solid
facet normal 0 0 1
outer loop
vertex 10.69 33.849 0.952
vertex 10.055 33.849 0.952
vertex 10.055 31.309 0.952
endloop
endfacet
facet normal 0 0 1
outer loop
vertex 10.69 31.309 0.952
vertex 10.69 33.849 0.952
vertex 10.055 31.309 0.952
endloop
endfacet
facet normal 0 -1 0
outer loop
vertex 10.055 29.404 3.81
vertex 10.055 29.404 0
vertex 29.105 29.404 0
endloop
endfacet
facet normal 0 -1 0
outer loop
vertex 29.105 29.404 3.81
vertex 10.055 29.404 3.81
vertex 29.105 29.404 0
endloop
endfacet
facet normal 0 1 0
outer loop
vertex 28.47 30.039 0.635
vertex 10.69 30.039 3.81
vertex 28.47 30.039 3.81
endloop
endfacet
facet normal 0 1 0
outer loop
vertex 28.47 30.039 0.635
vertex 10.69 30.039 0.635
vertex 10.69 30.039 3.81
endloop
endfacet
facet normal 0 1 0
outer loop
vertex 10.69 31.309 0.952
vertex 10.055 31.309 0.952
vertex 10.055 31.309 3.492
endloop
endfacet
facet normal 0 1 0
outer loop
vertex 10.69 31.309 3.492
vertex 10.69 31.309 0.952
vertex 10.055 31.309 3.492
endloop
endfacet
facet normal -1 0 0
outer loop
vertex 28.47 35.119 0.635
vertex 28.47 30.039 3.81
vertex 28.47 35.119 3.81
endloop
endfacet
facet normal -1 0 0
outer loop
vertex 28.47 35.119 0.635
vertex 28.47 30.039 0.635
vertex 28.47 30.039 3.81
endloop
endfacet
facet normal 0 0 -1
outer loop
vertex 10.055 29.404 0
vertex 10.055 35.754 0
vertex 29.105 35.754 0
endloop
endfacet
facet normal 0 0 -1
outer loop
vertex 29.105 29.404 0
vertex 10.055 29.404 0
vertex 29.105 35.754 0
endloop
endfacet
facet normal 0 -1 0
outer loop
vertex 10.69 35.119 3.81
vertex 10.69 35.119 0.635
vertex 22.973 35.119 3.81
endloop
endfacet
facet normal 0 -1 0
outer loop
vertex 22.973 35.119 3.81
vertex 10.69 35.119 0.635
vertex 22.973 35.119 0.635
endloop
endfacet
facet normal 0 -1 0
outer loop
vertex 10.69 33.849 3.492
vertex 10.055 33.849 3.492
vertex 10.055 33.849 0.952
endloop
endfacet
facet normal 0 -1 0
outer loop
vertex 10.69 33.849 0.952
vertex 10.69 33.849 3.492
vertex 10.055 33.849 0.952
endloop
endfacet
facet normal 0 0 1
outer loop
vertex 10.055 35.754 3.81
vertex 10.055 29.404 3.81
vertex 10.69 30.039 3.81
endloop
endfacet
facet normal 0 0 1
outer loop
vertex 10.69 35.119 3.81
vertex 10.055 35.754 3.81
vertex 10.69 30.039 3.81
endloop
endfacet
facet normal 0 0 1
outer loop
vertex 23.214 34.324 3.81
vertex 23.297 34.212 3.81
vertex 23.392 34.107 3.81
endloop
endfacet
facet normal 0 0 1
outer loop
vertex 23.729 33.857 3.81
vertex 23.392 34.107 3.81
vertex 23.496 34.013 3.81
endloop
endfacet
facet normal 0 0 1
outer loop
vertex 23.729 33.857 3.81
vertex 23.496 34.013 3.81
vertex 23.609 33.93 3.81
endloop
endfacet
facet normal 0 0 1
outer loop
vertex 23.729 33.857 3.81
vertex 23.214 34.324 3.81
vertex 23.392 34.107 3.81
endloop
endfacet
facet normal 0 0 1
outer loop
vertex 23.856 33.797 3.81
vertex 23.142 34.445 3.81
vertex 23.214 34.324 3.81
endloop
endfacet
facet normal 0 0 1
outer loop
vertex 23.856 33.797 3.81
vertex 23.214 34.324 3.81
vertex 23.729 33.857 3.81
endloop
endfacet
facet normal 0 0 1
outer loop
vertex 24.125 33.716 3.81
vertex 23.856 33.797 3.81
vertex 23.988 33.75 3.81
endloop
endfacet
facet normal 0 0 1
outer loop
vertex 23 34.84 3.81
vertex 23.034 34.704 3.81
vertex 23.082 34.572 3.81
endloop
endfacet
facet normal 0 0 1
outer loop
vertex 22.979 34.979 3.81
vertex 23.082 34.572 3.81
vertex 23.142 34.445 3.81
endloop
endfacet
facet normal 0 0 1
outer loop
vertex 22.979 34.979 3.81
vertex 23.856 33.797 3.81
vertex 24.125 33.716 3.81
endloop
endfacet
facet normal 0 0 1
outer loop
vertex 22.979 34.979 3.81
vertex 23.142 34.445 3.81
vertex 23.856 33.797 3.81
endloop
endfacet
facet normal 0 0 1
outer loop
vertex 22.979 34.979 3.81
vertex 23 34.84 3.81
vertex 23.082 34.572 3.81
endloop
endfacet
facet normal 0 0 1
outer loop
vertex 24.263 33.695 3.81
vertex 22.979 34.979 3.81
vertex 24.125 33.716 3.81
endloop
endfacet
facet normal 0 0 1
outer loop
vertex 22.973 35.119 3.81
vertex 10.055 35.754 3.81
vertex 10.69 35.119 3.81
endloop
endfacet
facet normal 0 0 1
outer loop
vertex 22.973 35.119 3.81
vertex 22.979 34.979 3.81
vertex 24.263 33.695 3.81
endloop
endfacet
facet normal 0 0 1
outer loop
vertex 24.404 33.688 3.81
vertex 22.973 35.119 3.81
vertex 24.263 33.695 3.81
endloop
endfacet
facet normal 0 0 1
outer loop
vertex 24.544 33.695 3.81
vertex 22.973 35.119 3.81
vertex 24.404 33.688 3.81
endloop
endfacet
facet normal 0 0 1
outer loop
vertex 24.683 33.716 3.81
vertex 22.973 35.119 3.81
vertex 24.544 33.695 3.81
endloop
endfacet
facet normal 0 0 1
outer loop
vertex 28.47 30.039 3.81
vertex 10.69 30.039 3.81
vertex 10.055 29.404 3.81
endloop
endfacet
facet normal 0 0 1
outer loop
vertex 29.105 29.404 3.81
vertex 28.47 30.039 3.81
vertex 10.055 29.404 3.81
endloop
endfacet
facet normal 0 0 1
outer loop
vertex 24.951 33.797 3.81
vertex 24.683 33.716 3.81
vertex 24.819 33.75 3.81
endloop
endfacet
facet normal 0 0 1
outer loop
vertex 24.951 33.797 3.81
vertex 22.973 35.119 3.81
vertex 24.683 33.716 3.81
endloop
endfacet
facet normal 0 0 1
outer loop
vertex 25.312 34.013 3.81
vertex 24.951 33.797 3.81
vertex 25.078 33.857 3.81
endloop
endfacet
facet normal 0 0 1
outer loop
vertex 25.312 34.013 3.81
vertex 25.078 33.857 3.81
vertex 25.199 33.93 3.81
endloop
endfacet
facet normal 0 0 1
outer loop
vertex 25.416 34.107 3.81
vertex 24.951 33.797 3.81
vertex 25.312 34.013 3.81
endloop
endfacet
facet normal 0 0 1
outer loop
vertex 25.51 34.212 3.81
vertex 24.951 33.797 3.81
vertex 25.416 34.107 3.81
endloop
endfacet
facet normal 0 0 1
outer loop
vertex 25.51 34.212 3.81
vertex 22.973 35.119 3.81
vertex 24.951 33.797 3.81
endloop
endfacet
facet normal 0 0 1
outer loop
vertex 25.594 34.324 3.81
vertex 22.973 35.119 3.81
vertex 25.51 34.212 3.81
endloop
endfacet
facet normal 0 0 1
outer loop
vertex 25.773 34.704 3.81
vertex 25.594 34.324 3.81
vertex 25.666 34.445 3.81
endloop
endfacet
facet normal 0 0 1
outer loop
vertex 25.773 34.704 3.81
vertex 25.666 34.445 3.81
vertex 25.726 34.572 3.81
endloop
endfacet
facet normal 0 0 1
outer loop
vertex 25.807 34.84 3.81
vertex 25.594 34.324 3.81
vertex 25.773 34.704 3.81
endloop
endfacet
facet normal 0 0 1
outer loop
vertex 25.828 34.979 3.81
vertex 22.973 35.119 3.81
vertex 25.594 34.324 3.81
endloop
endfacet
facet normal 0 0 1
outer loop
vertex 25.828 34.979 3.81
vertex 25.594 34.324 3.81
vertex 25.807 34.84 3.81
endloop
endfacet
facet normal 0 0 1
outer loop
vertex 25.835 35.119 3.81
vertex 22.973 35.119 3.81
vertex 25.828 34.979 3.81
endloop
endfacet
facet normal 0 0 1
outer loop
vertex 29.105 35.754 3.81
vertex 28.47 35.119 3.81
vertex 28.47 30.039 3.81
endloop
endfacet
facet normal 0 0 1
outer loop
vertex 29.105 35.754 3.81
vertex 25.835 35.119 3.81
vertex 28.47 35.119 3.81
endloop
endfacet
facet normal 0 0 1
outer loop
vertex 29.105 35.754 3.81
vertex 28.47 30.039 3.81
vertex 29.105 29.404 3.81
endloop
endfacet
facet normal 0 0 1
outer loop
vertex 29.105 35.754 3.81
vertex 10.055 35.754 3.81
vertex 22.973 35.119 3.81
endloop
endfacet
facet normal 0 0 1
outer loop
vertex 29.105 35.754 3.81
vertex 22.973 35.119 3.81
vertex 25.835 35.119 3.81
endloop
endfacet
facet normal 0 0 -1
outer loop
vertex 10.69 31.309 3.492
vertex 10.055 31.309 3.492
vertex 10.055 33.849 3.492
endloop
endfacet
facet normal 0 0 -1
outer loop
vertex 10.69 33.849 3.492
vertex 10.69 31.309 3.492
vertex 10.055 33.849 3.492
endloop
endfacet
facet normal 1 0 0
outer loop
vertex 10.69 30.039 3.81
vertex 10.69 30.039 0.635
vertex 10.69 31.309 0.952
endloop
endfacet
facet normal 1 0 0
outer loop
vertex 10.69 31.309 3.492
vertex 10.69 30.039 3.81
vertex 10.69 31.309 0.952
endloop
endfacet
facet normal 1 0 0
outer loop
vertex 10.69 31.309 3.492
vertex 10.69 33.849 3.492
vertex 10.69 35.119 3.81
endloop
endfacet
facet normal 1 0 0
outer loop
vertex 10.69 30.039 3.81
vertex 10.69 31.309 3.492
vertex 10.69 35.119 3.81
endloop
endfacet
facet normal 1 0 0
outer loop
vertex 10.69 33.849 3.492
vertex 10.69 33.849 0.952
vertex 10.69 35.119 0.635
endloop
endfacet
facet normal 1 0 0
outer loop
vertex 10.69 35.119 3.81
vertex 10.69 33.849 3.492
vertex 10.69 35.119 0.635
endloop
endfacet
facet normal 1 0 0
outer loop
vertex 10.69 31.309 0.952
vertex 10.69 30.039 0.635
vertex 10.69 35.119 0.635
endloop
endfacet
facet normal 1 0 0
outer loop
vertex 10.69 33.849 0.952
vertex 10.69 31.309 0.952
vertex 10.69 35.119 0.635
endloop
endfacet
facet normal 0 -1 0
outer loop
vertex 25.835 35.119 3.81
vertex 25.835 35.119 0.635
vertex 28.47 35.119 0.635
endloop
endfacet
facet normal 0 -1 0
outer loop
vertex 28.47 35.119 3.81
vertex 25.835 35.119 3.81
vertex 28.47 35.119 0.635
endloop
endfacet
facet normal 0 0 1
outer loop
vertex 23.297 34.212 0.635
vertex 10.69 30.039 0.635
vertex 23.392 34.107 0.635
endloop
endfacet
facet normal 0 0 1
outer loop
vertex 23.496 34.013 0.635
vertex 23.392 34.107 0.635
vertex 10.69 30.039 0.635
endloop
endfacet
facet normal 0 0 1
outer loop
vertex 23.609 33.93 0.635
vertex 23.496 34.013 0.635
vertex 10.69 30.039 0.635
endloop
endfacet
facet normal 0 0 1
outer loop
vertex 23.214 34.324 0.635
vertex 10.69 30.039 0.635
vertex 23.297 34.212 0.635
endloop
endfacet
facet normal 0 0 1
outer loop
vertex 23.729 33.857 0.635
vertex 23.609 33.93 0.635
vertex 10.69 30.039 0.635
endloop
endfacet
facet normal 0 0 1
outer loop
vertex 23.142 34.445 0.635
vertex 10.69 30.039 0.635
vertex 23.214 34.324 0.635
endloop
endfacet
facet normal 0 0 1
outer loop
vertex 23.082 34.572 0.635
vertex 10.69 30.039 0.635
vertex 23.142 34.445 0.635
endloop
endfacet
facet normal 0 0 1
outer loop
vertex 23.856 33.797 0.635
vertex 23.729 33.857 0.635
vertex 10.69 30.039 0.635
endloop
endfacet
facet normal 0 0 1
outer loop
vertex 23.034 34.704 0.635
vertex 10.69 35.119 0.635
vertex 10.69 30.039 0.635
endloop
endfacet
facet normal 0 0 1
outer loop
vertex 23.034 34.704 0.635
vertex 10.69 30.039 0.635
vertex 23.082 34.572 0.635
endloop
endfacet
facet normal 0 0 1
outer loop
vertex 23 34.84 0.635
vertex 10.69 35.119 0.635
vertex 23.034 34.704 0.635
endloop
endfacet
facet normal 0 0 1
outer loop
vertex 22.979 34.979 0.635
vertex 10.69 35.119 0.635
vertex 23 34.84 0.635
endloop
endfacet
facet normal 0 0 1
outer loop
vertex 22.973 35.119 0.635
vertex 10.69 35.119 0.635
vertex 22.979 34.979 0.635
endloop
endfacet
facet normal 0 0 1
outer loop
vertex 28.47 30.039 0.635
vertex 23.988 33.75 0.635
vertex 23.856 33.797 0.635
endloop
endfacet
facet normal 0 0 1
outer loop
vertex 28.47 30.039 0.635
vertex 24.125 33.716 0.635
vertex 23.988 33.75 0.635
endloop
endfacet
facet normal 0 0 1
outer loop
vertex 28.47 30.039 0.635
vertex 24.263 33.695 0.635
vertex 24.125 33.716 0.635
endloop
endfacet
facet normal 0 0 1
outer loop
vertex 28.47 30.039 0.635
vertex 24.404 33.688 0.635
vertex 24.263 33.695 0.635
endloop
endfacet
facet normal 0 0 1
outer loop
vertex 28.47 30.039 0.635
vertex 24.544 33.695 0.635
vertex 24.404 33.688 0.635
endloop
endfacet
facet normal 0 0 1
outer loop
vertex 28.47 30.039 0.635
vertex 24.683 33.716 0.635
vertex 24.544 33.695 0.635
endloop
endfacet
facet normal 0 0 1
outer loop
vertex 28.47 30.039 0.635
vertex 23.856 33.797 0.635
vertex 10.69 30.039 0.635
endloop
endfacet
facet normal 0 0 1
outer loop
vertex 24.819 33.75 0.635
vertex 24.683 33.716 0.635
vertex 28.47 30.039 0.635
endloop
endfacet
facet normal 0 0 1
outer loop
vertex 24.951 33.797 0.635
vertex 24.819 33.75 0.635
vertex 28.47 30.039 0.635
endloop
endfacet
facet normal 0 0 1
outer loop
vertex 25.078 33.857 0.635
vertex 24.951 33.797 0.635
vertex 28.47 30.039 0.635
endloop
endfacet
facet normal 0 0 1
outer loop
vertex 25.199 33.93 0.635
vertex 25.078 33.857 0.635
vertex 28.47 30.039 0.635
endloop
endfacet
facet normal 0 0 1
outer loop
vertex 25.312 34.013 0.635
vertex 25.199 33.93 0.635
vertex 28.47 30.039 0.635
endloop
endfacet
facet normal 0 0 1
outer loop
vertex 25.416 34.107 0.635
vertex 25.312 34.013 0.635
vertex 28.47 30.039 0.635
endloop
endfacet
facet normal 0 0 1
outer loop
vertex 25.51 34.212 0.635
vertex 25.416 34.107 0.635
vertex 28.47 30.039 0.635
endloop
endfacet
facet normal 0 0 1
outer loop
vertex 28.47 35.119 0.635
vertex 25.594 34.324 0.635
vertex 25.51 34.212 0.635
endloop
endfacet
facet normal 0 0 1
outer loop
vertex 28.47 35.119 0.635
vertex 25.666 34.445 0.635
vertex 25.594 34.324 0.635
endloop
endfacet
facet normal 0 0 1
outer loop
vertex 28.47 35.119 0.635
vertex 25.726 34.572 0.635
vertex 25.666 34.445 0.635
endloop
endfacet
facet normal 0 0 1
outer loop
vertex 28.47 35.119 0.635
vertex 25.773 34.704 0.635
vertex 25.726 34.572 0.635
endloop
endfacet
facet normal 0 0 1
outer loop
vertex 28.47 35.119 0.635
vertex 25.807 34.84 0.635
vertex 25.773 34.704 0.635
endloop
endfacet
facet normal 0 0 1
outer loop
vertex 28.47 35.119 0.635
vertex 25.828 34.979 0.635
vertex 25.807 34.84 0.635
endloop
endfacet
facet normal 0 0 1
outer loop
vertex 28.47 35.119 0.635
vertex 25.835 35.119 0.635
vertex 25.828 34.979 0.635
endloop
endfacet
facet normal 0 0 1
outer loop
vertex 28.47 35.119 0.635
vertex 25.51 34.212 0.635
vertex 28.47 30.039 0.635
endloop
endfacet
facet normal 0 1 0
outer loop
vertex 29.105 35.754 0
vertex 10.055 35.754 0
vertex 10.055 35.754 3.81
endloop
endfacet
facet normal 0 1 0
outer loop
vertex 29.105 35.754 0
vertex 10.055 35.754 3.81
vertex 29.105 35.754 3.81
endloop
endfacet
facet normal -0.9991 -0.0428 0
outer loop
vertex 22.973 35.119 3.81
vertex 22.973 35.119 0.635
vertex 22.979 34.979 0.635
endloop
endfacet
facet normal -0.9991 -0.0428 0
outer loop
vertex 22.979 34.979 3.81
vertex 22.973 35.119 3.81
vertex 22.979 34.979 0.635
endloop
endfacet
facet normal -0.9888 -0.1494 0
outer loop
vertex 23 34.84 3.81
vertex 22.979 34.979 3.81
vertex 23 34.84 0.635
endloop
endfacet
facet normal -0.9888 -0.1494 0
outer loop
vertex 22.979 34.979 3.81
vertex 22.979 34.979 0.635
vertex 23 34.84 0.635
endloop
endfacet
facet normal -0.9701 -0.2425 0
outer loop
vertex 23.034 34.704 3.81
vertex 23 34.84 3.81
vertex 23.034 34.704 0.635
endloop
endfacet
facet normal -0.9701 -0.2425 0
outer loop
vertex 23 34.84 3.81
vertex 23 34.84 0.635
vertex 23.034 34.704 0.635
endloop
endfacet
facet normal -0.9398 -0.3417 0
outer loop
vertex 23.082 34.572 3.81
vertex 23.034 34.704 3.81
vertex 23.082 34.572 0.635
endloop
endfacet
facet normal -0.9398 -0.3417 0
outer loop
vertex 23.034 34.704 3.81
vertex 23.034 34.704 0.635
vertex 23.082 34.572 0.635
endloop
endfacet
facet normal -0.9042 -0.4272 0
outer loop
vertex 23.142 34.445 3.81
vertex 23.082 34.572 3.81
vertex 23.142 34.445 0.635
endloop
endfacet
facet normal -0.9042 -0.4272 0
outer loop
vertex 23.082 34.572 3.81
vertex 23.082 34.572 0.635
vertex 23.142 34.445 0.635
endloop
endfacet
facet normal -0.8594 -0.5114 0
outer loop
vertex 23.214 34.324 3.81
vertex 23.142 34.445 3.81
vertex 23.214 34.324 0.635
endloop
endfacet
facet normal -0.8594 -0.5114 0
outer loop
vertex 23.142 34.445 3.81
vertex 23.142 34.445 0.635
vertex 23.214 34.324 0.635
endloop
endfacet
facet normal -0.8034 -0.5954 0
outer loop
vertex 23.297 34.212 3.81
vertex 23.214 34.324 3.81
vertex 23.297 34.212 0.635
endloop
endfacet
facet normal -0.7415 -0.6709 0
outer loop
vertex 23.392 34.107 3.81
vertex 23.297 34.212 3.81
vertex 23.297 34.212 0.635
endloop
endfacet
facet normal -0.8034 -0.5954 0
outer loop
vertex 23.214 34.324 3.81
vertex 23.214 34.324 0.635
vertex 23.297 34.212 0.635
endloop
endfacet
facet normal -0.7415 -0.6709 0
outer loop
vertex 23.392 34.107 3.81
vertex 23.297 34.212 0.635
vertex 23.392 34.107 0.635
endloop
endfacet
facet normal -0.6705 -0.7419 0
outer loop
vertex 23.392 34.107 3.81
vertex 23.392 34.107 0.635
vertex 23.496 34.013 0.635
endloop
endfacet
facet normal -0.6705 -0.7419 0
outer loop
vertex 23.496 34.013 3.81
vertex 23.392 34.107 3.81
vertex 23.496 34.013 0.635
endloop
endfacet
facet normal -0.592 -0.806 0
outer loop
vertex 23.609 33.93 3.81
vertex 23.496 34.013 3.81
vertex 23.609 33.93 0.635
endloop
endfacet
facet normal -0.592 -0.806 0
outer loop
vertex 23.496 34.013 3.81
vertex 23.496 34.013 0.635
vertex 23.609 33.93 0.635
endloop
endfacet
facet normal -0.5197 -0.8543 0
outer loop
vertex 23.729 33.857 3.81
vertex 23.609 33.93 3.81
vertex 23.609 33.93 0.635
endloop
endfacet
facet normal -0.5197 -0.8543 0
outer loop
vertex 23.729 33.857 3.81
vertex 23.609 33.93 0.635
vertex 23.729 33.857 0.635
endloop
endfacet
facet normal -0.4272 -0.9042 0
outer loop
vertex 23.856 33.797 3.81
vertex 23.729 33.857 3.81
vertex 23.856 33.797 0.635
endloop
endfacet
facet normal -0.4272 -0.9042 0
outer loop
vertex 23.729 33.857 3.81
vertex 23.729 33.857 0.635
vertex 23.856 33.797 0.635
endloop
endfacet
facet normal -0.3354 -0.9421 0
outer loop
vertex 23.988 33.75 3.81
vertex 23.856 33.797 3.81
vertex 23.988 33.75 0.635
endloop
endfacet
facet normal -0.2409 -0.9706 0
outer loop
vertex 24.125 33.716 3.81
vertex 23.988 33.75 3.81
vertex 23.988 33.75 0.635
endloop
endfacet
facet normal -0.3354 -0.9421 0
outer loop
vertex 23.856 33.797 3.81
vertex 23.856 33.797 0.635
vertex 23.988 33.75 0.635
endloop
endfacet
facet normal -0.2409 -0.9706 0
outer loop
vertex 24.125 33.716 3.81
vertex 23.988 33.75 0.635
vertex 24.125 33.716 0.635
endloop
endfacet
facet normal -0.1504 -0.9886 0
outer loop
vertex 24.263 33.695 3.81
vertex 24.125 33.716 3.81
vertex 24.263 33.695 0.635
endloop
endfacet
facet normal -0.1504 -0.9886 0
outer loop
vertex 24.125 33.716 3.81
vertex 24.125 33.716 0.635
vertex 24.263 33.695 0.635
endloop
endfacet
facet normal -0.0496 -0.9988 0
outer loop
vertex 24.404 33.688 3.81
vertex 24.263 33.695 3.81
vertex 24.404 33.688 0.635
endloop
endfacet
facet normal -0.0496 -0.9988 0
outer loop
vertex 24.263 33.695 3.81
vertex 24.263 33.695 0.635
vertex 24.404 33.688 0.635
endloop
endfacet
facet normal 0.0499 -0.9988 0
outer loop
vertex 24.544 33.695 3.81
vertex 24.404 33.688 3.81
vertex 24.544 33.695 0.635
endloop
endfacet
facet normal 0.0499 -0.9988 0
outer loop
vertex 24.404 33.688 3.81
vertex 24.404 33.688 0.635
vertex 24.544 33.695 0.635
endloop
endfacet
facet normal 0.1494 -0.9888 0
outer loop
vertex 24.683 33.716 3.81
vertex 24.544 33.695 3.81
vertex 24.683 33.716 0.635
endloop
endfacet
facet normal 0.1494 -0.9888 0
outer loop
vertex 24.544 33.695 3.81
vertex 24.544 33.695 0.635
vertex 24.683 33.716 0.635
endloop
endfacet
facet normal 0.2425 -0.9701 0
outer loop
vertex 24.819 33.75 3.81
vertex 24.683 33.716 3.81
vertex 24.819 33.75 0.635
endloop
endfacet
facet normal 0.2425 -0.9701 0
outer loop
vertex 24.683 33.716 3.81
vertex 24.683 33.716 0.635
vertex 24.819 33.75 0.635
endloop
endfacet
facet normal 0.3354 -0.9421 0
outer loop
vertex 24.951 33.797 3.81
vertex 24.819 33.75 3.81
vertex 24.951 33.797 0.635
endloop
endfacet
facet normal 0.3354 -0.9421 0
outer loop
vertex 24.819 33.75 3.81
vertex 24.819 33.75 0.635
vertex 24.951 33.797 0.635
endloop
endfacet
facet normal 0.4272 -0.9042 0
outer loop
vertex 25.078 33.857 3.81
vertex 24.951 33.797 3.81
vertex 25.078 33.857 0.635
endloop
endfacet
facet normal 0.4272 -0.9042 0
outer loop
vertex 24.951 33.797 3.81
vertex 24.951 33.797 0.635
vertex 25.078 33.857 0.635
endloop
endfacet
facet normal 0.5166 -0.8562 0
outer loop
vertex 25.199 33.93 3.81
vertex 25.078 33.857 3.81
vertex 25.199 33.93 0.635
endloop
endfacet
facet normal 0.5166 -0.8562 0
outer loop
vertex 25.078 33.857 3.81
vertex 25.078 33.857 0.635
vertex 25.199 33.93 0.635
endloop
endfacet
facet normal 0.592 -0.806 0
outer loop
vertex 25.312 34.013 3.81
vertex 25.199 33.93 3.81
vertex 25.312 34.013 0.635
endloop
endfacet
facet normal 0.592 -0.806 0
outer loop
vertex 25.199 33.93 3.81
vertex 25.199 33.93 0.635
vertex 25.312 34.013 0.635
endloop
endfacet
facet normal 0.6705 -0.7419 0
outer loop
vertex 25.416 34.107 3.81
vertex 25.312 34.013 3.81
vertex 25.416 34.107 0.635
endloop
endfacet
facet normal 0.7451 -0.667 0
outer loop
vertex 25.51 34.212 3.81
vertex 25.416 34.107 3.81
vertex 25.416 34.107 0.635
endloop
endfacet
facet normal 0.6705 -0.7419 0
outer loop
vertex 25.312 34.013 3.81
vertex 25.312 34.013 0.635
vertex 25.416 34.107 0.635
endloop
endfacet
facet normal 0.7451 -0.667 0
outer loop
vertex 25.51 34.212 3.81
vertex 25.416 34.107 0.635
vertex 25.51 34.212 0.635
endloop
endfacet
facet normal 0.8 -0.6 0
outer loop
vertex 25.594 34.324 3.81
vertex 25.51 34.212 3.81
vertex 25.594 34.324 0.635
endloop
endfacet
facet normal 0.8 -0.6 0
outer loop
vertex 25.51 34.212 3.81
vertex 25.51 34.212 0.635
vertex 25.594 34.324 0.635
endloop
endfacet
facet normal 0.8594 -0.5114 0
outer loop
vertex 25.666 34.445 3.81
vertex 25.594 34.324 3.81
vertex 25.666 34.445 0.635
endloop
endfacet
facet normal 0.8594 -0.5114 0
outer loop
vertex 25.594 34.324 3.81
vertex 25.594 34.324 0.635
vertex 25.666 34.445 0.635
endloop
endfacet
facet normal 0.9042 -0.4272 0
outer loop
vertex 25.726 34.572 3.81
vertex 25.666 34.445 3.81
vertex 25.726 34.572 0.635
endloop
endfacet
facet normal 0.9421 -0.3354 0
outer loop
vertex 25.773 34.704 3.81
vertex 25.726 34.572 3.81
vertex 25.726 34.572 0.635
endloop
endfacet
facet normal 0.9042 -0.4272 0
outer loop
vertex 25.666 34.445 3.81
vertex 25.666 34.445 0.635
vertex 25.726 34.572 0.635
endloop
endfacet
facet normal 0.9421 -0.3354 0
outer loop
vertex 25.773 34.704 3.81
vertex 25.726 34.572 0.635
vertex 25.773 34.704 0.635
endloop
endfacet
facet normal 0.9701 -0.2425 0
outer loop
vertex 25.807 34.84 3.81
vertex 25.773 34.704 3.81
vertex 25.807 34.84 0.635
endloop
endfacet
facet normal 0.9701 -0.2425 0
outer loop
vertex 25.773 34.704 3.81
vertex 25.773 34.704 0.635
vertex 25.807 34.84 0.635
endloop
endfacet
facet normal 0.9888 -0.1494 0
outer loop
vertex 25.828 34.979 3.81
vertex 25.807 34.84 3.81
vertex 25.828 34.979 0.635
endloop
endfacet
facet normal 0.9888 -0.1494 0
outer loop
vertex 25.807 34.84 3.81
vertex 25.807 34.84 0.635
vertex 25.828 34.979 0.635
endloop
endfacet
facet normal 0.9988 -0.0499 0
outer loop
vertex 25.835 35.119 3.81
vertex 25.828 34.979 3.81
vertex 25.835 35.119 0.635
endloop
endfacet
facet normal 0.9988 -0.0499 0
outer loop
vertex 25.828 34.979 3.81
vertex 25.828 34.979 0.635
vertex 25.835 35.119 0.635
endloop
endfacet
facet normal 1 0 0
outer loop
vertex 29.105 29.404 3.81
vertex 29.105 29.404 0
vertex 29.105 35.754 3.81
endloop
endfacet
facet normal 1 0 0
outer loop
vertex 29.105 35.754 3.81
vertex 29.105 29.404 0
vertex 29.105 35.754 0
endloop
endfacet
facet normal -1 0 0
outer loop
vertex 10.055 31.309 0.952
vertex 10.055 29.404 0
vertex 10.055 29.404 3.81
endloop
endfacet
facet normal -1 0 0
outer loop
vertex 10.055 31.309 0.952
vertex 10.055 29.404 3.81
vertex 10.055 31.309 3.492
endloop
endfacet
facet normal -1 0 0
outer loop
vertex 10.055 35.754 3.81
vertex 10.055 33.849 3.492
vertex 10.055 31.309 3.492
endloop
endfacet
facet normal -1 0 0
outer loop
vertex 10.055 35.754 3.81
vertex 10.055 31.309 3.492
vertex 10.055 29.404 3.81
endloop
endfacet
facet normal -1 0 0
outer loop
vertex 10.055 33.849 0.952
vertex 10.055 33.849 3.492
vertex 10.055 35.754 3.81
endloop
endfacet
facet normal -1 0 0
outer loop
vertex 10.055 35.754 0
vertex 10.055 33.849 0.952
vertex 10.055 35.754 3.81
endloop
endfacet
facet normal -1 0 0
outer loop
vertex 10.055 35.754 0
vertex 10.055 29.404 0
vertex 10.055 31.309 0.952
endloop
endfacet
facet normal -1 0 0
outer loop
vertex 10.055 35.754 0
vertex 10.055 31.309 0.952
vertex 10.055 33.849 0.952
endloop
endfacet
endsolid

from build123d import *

# Parameters (mm, degrees)
F0_W     = 19.05
F0_H     = 6.35
F1_DEPTH = 3.81
F2_T     = -0.635
F4_DEPTH = 3.175
F5_W     = 1.27
F5_H     = 1.27
F6_DEPTH = 0.635


with BuildPart() as f1:
    # F0 (on Top) → F1 (new body)
    with BuildSketch(Plane.XY):
        with Locations((19.5798018083, 32.579488121)):
            Rectangle(F0_W, F0_H)
    extrude(amount=F1_DEPTH)

    # F2
    f2_openings = [f1.faces().sort_by_distance(p)[0] for p in [
        (19.579802, 32.579488, 3.81),
    ]]
    offset(amount=F2_T, openings=f2_openings)

    # F3 (on face) → F4 (join)
    with BuildSketch(Plane.XY.offset(0.635)):
        with BuildLine():
            ThreePointArc((22.9725916315, 35.119488121), (24.4037620723, 33.6883176802), (25.8349325131, 35.119488121))
            Line((25.8349325131, 35.119488121), (22.9725916315, 35.119488121))
        make_face()
    extrude(amount=F4_DEPTH)

    # F5 (on face) → F6 (cut)
    with BuildSketch(Plane(origin=(10.0548018083, 0, 0), x_dir=(0, -1, 0), z_dir=(-1, 0, 0))):
        with Locations((-33.214488121, 2.8575)):
            Rectangle(F5_W, F5_H)
        with Locations((-31.944488121, 2.8575)):
            Rectangle(F5_W, F5_H)
        with Locations((-31.944488121, 1.5875)):
            Rectangle(F5_W, F5_H)
        with Locations((-33.214488121, 1.5875)):
            Rectangle(F5_W, F5_H)
    extrude(amount=-F6_DEPTH, mode=Mode.SUBTRACT)


solid = f1.part
